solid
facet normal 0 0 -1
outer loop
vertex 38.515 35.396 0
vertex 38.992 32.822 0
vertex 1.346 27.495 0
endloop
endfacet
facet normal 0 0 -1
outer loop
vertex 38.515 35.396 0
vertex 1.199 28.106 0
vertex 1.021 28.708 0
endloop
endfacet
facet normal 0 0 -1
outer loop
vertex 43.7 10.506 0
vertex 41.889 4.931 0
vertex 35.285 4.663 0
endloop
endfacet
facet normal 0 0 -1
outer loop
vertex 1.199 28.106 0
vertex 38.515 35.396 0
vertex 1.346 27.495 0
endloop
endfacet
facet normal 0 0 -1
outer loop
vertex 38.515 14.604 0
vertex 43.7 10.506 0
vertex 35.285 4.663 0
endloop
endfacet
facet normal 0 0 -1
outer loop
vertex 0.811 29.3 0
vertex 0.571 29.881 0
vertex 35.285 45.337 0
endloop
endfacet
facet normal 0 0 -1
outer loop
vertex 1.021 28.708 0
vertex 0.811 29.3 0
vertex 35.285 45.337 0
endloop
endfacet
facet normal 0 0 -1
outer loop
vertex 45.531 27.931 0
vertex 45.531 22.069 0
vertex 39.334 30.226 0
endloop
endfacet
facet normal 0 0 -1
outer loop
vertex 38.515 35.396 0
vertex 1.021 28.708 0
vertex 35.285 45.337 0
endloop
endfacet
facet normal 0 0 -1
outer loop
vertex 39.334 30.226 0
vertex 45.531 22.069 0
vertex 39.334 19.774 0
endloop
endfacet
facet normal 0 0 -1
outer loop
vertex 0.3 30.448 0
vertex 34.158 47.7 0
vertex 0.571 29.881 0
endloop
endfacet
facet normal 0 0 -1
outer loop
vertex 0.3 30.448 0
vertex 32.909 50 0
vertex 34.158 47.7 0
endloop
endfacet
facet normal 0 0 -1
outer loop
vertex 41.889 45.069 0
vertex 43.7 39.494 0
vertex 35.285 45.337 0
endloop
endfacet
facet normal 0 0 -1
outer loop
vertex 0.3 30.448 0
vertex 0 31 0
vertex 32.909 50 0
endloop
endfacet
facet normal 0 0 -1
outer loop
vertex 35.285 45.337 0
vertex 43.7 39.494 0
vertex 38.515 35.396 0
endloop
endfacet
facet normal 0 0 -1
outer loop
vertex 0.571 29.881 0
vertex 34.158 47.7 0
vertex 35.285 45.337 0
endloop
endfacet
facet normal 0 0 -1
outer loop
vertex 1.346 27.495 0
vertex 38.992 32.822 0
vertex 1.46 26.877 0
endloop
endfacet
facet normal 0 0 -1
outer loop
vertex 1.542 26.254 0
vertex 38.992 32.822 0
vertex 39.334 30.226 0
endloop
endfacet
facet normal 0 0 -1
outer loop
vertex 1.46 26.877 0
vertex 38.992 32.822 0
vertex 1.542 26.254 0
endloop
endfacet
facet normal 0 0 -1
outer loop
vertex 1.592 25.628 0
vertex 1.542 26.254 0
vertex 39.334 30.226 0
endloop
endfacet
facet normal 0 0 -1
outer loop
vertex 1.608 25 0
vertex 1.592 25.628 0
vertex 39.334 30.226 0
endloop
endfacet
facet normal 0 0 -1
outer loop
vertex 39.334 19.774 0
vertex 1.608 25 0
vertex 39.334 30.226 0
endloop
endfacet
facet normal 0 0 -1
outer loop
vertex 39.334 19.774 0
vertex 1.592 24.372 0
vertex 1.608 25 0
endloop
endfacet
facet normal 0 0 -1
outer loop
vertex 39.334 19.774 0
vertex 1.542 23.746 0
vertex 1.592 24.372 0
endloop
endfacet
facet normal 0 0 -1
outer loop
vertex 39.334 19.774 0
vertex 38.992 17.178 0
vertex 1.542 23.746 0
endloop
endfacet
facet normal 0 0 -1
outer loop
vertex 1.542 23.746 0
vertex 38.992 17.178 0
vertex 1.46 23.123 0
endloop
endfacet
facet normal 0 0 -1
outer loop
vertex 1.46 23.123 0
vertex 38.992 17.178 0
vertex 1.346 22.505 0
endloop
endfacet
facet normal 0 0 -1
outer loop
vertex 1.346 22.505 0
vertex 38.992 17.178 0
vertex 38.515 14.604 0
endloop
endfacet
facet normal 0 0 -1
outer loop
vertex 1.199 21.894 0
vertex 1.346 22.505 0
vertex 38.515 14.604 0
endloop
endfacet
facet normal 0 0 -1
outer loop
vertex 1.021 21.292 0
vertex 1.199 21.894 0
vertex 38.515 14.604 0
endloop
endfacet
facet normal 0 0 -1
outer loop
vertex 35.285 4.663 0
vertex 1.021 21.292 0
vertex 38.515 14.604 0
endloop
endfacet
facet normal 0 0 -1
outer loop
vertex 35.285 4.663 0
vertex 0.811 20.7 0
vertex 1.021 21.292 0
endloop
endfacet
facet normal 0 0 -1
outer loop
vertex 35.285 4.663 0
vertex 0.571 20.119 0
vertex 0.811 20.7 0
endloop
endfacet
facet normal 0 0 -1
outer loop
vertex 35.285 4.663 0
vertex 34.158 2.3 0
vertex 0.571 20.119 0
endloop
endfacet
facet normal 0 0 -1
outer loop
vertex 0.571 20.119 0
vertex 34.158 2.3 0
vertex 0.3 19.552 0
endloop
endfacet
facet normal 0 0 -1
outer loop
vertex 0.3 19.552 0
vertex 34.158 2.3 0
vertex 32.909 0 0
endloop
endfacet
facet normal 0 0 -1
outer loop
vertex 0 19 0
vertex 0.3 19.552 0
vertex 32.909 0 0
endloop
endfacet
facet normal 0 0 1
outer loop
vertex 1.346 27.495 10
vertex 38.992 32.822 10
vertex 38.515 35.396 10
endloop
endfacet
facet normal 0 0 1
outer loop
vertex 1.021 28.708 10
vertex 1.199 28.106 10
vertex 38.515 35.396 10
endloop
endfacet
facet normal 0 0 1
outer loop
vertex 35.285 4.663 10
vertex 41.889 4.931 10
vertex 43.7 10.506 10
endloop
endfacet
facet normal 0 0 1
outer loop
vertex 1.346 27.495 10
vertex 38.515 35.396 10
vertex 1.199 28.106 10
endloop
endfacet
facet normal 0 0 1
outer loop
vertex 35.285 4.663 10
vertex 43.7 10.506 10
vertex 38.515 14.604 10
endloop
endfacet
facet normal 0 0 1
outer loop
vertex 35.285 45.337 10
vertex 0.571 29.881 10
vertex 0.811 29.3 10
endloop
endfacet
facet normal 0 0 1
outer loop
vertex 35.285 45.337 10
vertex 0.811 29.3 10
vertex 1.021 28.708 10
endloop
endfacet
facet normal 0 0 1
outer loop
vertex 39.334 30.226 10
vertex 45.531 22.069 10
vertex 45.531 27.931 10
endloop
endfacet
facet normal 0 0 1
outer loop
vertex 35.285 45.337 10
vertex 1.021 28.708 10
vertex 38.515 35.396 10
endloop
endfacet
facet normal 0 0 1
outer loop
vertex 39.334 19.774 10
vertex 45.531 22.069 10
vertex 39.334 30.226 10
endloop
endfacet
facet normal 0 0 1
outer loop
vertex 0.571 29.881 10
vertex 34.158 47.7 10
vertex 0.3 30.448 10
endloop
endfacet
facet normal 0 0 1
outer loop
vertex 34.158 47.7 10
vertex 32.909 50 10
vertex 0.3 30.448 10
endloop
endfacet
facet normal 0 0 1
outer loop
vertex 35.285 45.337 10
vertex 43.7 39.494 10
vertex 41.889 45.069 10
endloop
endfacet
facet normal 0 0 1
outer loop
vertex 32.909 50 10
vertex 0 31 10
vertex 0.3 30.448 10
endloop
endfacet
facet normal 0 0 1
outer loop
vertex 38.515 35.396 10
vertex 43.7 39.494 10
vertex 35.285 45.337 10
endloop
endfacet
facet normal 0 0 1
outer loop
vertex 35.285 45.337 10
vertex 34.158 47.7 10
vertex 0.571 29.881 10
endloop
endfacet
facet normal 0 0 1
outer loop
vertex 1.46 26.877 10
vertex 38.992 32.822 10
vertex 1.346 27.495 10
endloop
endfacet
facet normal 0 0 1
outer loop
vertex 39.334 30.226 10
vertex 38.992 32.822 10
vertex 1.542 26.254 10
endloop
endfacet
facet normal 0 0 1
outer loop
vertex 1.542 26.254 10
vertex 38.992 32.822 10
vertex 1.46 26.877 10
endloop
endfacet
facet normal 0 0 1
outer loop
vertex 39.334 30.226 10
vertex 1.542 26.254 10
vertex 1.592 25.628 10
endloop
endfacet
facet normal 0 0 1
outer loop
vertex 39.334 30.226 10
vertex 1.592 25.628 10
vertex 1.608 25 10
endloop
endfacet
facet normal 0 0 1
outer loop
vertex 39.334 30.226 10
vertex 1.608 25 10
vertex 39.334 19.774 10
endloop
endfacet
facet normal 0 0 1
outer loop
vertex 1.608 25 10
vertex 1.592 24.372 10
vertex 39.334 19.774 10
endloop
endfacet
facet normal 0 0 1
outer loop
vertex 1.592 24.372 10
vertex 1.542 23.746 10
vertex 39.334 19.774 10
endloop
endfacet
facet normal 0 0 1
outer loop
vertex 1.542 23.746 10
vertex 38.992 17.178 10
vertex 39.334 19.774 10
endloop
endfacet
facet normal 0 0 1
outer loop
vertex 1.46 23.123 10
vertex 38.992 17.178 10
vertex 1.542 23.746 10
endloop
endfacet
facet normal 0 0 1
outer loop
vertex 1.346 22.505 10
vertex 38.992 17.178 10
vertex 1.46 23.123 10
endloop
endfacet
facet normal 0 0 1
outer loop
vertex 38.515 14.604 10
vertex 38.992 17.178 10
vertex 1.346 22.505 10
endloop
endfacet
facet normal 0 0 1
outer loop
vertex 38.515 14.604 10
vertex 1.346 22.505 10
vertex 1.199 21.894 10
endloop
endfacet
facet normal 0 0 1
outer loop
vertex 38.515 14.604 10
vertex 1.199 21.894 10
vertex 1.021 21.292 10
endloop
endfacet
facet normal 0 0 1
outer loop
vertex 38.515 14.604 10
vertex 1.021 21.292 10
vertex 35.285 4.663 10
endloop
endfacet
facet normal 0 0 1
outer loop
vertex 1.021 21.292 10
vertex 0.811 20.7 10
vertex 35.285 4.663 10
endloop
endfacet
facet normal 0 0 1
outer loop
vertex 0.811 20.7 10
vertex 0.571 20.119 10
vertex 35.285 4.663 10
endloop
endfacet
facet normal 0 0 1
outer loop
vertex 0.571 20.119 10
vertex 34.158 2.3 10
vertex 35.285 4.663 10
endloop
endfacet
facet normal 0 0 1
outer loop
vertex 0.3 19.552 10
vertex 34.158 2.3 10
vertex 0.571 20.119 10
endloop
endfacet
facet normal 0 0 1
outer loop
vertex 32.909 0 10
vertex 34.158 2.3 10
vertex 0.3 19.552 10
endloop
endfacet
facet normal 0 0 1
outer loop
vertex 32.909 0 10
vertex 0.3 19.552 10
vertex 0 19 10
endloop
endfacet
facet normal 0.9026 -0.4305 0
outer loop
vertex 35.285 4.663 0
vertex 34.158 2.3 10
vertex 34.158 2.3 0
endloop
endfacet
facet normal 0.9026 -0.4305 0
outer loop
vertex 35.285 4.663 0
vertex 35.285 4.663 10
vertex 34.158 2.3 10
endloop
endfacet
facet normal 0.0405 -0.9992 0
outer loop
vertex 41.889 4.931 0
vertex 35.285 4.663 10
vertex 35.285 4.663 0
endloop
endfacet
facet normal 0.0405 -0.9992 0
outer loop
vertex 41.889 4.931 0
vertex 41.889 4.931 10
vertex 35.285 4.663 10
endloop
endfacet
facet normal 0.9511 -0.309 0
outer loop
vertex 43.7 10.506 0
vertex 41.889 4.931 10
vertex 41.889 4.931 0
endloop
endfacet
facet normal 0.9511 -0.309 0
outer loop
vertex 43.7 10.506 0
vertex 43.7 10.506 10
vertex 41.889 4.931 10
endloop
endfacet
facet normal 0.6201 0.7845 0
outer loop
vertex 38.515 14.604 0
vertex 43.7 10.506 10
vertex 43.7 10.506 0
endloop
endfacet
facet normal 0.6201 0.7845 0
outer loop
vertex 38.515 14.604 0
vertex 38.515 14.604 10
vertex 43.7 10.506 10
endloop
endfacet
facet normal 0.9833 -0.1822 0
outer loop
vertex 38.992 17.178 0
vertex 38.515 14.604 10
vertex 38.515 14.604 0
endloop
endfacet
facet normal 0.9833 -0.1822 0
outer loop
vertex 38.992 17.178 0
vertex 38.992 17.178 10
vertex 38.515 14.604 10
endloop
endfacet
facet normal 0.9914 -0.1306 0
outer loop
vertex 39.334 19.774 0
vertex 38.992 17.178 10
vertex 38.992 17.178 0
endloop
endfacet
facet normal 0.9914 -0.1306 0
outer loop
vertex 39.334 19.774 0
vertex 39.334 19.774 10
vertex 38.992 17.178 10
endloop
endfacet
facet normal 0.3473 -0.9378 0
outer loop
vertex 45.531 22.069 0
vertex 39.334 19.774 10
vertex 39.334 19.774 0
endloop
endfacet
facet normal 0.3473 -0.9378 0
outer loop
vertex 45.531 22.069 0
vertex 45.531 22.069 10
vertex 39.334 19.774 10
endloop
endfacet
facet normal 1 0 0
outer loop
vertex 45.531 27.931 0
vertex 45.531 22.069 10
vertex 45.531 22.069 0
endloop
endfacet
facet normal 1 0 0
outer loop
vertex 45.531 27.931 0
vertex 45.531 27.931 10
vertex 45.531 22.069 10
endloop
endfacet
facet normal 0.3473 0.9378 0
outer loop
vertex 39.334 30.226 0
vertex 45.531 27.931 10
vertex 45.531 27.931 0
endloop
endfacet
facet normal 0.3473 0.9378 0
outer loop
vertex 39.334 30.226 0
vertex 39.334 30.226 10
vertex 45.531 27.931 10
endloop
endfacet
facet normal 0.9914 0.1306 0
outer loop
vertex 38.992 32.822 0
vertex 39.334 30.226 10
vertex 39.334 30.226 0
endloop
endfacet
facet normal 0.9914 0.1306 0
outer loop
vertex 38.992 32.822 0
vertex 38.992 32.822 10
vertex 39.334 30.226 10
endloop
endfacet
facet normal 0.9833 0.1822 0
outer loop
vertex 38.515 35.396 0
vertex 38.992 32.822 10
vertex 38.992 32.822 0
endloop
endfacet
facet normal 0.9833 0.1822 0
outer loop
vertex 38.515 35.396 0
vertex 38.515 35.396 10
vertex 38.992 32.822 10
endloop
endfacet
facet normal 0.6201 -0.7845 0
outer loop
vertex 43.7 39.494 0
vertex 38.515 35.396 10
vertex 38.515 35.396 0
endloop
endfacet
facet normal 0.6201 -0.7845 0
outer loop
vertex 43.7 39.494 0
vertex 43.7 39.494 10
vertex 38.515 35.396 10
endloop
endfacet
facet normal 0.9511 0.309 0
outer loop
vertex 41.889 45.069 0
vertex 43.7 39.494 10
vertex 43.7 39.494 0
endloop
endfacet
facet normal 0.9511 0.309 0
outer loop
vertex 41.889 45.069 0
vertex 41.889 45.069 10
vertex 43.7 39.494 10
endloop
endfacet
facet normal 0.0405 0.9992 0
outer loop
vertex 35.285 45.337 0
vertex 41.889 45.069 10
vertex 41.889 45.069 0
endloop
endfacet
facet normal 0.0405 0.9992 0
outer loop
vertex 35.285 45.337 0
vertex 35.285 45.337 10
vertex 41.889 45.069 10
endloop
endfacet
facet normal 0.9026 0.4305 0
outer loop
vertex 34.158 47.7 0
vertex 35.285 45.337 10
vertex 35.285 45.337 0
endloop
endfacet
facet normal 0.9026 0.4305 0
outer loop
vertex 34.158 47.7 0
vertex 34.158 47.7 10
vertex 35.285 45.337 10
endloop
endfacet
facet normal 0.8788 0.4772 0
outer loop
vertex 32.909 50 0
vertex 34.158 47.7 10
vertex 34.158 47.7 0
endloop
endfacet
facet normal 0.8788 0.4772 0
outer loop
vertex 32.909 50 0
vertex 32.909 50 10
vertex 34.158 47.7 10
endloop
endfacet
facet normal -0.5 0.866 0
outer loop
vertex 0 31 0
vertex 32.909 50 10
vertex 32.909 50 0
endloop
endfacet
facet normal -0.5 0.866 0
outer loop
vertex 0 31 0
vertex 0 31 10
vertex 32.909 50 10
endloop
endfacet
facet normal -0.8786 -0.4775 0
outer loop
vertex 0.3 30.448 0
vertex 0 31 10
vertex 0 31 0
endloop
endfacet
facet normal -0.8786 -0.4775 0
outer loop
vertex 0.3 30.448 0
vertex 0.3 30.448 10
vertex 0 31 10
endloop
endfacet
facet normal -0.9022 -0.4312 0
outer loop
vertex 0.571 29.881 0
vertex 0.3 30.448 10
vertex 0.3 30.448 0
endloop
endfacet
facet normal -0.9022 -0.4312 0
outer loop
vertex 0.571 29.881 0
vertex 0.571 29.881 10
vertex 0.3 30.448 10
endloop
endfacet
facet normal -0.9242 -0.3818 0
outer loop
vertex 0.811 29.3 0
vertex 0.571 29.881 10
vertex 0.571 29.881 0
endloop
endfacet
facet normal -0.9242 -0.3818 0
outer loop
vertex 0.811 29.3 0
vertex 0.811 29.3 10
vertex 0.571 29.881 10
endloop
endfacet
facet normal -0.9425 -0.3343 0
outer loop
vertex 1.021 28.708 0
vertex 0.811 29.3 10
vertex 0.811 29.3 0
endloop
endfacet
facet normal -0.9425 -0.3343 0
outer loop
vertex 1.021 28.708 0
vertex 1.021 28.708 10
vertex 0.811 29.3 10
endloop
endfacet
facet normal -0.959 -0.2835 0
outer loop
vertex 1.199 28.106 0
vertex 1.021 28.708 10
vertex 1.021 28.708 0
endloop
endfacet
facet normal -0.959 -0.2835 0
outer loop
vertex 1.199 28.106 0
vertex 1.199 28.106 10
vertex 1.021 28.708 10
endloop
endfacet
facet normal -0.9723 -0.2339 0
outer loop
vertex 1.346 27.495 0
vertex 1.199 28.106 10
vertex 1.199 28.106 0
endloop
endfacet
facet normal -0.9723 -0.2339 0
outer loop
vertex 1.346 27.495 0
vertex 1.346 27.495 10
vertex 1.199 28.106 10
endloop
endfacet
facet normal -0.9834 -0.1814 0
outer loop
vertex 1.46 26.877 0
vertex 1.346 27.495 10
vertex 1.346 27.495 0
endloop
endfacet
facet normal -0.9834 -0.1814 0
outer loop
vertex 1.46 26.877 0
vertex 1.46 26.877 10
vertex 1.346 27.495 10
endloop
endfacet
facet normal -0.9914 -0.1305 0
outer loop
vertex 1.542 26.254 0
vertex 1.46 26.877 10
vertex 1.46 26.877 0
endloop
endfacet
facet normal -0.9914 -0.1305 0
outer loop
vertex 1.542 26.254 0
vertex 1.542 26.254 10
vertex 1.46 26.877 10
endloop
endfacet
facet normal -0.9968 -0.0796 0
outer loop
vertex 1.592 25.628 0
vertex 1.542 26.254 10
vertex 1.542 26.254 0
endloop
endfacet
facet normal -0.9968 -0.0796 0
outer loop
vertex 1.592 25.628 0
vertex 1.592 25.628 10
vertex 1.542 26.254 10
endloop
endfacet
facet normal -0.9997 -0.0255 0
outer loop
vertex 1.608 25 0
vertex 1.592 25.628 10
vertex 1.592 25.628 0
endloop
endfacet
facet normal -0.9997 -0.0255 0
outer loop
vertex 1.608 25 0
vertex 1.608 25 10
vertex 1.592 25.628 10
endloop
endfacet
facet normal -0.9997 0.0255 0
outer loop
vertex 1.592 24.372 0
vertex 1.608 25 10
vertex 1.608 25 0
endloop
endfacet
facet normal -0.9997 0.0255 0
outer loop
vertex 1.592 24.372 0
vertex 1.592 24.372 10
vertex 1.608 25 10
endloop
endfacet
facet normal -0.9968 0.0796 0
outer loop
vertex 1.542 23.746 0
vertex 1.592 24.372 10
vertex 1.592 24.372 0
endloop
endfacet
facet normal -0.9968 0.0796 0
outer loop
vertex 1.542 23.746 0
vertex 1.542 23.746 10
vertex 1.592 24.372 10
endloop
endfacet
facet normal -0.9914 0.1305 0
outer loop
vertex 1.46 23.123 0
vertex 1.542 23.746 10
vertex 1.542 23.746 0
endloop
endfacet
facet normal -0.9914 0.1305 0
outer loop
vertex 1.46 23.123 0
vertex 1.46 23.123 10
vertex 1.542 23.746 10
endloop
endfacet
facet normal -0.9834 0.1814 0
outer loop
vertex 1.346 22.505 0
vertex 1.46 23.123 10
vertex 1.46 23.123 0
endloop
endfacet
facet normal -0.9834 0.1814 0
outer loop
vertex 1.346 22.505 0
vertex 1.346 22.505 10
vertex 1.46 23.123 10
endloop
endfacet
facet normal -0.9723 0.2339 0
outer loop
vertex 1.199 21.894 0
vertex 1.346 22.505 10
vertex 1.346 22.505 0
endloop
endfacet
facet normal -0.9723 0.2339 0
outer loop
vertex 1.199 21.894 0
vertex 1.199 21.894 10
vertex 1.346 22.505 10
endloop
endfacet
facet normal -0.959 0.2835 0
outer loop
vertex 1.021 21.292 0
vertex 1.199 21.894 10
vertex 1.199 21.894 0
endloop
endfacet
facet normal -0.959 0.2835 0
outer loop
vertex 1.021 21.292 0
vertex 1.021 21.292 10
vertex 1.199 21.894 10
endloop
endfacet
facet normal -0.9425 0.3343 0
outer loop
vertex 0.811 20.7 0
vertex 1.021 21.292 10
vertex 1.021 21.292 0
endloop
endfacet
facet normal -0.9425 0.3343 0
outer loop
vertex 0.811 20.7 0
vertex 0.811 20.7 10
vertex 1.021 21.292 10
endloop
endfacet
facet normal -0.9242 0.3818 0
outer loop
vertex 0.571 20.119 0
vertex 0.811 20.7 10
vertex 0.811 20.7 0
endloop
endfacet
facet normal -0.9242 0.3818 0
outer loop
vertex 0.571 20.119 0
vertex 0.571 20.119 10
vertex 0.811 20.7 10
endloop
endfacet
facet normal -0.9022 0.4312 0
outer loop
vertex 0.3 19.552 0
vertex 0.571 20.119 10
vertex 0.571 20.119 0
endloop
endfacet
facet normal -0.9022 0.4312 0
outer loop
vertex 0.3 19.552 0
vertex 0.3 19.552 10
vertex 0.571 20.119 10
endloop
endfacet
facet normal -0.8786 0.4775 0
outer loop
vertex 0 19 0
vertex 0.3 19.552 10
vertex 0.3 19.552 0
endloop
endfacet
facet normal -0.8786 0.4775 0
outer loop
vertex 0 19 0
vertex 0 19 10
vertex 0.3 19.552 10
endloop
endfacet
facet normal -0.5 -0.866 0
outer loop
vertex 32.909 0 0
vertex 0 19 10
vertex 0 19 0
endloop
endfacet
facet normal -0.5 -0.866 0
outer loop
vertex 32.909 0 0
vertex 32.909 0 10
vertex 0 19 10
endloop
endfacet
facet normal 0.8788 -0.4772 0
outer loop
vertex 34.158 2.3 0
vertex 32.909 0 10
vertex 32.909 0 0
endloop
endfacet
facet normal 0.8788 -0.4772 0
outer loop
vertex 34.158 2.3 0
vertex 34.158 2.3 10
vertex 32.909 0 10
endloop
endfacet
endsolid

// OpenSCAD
$fn = 32;

// ----------------------------------------------------------------------
// Gear sector: 3 teeth on 60 degrees
// ----------------------------------------------------------------------

// --- parameters (mm) ---
sector_angle = 60;        // sector angle, degrees
root_r = 50;              // root circle radius
tooth_h = 6;              // tooth height over the root circle
teeth = 3;                // number of teeth on the sector
hub_r = 12;               // hub bore radius
plate_t = 10;             // sector thickness, Z
arc_step = 3;             // sampling step of the root/hub arcs, degrees

tip_r = root_r + tooth_h;  // tip circle radius

profile = [[32.909, 0], [34.158, 2.3], [35.285, 4.663], [41.889, 4.931], [43.7, 10.506], [38.515, 14.604], [38.992, 17.178], [39.334, 19.774], [45.531, 22.069], [45.531, 27.931], [39.334, 30.226], [38.992, 32.822], [38.515, 35.396], [43.7, 39.494], [41.889, 45.069], [35.285, 45.337], [34.158, 47.7], [32.909, 50], [0, 31], [0.3, 30.448], [0.571, 29.881], [0.811, 29.3], [1.021, 28.708], [1.199, 28.106], [1.346, 27.495], [1.46, 26.877], [1.542, 26.254], [1.592, 25.628], [1.608, 25], [1.592, 24.372], [1.542, 23.746], [1.46, 23.123], [1.346, 22.505], [1.199, 21.894], [1.021, 21.292], [0.811, 20.7], [0.571, 20.119], [0.3, 19.552], [0, 19]];  // primary outline, 39 points, counter clockwise

// --- the one profile operation ---
linear_extrude(height = plate_t) polygon(points = profile);
